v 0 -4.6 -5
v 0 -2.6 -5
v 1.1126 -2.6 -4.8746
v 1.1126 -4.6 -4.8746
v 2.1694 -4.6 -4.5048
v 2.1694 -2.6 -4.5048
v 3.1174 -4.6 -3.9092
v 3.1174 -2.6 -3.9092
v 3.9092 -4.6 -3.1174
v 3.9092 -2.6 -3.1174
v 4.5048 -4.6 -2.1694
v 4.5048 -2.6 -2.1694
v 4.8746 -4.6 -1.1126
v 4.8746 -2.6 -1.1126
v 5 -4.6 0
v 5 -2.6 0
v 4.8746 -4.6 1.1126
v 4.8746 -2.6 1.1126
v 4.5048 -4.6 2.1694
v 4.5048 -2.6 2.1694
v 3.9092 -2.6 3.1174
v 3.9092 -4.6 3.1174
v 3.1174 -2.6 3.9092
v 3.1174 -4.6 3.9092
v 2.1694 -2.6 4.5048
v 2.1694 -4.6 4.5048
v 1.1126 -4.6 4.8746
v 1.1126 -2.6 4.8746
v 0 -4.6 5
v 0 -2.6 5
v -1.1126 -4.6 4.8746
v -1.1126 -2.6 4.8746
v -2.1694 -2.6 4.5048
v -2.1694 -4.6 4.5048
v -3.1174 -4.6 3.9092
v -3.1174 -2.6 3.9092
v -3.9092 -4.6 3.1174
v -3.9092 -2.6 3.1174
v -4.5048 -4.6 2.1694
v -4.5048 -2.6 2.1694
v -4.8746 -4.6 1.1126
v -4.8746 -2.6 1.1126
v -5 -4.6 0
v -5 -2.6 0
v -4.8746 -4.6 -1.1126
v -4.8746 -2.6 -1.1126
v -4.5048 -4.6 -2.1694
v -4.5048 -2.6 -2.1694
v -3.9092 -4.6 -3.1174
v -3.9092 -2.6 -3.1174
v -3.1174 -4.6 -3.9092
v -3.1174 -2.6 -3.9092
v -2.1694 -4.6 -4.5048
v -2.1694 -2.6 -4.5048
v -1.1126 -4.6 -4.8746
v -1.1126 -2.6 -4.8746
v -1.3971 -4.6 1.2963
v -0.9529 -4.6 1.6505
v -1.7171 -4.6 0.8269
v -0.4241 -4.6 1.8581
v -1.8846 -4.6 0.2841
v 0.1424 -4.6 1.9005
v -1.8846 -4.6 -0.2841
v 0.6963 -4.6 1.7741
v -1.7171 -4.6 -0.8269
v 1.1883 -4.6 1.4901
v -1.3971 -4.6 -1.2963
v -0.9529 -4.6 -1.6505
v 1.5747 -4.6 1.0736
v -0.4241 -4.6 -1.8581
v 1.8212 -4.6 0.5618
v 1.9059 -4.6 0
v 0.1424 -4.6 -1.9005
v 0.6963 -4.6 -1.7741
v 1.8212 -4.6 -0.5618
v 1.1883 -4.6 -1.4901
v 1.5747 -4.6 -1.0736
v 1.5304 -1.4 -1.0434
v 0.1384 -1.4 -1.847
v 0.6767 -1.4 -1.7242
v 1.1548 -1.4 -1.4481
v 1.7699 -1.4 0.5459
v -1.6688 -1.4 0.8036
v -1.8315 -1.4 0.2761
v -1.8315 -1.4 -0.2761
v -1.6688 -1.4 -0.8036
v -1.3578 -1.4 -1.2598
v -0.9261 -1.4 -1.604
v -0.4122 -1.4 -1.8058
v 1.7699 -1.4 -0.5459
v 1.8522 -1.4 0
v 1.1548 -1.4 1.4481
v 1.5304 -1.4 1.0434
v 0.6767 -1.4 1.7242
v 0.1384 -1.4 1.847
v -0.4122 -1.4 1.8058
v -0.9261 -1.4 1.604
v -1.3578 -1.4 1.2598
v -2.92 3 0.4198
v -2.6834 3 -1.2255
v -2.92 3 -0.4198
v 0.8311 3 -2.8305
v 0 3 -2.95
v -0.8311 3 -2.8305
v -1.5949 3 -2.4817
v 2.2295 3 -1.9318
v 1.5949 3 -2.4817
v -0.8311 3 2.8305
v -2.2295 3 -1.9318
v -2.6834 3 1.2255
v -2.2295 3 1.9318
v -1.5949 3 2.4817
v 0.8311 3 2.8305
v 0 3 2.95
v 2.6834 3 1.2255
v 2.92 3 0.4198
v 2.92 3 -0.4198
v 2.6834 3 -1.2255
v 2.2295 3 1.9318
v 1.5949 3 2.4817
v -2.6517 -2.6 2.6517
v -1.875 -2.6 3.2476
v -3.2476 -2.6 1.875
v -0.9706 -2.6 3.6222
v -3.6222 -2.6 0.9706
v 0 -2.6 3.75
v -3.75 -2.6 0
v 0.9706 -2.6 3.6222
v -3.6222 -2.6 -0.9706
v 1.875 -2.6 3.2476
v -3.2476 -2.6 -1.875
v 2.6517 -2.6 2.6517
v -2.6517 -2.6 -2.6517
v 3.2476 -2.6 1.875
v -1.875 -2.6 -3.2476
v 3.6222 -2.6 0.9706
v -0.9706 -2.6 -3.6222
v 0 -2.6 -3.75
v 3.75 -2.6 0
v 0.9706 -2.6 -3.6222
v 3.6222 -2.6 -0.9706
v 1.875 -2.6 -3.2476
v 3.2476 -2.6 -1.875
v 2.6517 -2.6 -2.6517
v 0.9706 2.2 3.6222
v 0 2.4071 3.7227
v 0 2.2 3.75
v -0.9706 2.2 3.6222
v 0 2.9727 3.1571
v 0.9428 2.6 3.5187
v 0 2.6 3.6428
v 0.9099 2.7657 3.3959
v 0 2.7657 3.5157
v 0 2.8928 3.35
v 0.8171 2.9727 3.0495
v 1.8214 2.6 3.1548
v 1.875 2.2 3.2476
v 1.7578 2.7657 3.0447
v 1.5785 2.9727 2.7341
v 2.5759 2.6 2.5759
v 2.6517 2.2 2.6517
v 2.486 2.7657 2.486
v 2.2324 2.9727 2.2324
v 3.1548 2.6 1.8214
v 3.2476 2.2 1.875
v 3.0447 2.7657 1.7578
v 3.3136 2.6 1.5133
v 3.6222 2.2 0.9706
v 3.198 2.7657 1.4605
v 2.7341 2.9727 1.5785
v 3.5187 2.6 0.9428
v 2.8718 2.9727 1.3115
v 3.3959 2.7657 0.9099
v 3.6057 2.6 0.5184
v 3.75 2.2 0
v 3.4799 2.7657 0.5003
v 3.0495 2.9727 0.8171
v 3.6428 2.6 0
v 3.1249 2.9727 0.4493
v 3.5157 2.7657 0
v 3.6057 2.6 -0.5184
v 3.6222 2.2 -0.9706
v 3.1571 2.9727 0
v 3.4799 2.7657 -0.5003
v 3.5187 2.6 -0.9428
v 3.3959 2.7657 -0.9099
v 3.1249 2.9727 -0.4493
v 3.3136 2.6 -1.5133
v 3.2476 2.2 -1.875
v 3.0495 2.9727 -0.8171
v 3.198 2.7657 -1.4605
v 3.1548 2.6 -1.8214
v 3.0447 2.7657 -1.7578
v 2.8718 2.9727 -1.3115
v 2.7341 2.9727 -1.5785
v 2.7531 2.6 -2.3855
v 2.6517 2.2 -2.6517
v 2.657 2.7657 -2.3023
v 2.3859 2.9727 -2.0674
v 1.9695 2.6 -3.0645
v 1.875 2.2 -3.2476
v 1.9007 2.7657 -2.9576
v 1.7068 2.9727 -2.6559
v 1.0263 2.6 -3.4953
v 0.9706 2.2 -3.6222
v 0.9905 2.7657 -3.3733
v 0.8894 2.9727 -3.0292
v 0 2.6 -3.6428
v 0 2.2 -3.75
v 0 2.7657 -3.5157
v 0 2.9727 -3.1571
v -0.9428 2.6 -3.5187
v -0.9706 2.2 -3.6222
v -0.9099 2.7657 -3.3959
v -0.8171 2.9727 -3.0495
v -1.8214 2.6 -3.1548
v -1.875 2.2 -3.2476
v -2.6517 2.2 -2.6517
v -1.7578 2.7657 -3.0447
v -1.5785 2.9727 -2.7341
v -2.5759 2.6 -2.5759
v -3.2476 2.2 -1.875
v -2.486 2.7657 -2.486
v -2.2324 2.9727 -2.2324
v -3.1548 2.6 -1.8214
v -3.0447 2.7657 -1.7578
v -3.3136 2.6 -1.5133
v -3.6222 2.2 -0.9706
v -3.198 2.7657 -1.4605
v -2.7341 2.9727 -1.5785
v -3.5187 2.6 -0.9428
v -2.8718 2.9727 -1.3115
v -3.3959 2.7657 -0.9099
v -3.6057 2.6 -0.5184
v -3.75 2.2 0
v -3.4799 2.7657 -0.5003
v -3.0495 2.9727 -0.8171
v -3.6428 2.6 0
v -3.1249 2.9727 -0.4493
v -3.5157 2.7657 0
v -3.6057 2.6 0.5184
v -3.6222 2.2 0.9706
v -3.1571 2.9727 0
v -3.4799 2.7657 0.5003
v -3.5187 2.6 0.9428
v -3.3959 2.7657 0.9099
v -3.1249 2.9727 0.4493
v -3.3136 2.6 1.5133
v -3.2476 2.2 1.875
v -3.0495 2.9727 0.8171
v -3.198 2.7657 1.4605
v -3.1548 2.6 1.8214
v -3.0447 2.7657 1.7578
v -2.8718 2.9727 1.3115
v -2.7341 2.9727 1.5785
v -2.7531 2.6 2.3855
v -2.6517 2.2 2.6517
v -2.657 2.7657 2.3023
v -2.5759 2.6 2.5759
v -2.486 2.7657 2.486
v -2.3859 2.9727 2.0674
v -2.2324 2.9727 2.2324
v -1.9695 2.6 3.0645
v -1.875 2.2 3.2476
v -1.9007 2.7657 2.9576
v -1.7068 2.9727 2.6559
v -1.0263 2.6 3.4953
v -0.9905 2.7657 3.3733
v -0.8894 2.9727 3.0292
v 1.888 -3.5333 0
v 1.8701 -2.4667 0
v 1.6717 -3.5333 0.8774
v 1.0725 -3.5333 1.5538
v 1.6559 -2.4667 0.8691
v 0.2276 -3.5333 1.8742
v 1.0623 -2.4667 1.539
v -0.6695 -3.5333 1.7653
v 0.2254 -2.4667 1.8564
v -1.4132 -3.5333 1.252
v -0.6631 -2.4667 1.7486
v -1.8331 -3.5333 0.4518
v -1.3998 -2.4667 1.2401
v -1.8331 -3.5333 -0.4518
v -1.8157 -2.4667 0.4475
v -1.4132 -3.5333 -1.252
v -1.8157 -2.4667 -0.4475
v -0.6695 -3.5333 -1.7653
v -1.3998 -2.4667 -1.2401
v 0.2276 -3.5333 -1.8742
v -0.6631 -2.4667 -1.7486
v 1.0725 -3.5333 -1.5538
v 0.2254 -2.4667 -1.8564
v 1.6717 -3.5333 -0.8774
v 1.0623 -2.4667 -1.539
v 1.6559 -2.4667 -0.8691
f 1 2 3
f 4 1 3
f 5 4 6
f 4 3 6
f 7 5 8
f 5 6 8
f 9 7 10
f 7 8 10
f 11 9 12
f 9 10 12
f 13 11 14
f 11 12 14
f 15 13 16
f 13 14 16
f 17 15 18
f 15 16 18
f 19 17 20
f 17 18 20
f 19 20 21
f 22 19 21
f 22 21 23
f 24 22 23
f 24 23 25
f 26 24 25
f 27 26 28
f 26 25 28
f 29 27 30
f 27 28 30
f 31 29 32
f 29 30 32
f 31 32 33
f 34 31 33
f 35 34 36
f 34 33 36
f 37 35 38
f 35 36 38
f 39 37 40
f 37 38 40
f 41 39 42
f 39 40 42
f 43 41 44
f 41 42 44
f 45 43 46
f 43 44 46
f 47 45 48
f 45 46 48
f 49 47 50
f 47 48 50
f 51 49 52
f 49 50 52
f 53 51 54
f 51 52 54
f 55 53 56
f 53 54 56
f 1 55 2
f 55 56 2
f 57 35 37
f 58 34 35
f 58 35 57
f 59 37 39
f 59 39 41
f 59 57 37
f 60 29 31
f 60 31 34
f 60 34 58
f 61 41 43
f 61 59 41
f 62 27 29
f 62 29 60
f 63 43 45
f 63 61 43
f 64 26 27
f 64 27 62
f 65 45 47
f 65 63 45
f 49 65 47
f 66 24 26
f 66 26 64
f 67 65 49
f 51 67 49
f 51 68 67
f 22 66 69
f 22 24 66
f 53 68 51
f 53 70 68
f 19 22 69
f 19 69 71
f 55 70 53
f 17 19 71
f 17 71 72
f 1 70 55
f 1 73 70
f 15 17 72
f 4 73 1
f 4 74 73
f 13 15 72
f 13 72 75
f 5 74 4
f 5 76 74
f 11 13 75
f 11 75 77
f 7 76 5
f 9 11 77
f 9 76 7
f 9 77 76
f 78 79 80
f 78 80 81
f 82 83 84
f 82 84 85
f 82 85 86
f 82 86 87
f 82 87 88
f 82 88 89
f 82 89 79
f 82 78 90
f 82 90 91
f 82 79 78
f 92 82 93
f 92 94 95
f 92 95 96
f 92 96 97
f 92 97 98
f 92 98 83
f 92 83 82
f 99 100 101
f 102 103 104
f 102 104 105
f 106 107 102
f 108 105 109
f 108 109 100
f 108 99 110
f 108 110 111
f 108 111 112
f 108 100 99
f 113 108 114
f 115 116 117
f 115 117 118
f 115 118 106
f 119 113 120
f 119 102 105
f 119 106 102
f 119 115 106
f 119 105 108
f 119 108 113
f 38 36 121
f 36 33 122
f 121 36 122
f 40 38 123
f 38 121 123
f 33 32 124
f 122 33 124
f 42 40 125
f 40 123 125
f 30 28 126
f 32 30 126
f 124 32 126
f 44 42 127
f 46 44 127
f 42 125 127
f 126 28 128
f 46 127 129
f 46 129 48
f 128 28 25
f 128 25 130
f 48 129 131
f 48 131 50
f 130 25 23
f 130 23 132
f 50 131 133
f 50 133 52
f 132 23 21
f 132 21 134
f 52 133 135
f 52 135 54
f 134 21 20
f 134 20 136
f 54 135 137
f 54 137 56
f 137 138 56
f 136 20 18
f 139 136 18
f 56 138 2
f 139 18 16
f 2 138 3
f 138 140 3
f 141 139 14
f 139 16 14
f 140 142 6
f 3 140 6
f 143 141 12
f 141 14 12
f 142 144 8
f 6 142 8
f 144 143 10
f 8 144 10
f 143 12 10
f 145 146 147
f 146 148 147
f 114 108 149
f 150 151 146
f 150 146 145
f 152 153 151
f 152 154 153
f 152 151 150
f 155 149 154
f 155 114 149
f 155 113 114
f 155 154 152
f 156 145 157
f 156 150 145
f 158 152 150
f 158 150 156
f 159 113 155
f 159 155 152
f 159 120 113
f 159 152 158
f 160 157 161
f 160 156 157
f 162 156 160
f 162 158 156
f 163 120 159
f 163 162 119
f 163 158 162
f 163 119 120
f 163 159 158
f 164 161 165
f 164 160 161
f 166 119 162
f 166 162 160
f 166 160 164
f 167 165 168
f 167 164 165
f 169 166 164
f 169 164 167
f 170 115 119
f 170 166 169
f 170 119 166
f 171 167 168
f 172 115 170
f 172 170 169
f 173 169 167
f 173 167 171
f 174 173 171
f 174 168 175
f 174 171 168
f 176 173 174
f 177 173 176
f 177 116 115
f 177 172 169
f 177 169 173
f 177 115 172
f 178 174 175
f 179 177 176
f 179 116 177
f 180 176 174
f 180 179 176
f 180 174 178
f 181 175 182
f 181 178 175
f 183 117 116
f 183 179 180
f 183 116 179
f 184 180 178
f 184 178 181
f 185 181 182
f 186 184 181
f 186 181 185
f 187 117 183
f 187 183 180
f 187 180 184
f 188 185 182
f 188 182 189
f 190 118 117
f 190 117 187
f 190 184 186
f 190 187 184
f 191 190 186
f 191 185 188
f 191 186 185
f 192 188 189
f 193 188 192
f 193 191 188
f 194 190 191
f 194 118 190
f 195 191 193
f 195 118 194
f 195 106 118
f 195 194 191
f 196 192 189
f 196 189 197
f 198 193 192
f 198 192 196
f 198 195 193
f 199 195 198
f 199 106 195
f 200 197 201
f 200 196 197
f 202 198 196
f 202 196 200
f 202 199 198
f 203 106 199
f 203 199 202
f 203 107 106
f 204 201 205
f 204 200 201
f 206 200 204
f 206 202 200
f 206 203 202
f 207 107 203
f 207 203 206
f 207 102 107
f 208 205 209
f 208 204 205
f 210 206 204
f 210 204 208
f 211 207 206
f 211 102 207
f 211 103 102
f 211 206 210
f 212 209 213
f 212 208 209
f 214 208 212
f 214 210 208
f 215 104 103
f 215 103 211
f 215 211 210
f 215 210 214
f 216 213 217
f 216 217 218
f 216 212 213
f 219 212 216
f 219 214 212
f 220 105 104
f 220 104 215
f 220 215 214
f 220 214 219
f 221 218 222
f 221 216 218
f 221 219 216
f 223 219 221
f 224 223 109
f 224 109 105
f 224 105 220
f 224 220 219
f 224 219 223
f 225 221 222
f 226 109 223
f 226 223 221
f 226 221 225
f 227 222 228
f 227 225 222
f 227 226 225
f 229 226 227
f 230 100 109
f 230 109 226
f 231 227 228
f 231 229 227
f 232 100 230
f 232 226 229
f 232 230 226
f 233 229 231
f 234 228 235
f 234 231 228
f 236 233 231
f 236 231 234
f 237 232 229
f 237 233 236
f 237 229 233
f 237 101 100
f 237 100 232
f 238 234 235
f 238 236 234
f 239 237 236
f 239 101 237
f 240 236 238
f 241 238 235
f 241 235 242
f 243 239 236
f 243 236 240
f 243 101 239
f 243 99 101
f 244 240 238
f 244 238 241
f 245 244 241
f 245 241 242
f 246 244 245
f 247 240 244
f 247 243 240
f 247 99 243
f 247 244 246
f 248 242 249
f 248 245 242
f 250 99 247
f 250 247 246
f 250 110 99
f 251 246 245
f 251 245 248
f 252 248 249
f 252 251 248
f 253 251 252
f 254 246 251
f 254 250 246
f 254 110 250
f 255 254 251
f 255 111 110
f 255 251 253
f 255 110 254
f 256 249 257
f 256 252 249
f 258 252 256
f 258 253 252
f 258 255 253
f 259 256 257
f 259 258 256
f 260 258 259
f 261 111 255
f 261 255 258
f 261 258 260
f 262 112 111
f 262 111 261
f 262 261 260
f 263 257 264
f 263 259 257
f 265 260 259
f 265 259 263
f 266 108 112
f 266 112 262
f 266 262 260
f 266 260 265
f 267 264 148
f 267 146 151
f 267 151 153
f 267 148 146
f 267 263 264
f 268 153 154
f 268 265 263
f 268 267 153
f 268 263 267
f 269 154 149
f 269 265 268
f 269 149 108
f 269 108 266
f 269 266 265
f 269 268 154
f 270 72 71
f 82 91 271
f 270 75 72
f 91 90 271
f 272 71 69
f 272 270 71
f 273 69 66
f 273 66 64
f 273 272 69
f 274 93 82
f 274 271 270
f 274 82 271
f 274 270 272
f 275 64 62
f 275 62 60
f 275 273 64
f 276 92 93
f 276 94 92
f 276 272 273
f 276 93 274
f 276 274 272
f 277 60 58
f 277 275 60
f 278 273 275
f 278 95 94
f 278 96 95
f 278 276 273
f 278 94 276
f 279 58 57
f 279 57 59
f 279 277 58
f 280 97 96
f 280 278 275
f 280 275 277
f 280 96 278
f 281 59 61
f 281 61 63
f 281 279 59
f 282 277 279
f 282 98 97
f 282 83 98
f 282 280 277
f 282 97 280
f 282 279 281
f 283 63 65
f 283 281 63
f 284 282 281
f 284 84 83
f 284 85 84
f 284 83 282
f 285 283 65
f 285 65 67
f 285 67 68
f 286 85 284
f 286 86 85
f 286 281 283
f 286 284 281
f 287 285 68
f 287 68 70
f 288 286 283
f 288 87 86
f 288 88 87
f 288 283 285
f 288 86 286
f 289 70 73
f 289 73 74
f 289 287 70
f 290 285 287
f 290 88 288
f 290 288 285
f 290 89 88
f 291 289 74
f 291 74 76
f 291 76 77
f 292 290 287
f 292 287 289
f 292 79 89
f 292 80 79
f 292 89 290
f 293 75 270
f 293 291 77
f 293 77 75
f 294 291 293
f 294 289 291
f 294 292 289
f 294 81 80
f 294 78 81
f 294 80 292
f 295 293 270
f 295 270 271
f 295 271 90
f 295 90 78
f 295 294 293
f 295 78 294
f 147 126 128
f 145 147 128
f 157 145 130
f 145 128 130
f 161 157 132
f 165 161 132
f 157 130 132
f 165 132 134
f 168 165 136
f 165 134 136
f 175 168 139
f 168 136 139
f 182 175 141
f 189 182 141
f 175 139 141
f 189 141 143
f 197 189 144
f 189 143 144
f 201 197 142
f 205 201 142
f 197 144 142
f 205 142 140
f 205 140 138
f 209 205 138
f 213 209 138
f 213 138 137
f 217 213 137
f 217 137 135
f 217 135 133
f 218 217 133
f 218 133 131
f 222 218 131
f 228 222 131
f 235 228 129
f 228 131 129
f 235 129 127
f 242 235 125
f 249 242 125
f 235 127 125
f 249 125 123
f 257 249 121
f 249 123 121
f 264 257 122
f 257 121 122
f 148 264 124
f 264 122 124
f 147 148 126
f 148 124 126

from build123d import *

# Parameters (mm, degrees)
EXTRUDE_1_DEPTH      = 3
EXTRUDE_1_DEPTH_BACK = 2.6
SKETCH_1_R           = 3.75
SKETCH_2_R           = 5
EXTRUDE_2_DEPTH      = 2
FILLET_1_R           = 0.8
SKETCH_3_R           = 1.905870149
SKETCH_4_R           = 1.852192046


# Read off the part's stored shape, not the designer's step: Отступ5
with BuildPart() as part:
    # Эскиз1 → Бобышка-Вытянуть1 (new, two sides: drawn at the far end of the back side and taken through both)
    with BuildSketch(Plane(origin=(0, 0, 0), x_dir=(1, 0, 0), z_dir=(0, 1, 0)).offset(-EXTRUDE_1_DEPTH_BACK)):
        with Locations(Location((0, 0, 0), (0, 0, 270))):
            Circle(SKETCH_1_R)
    extrude(amount=EXTRUDE_1_DEPTH + EXTRUDE_1_DEPTH_BACK)

    # Эскиз2 → Бобышка-Вытянуть2 (add)
    with BuildSketch(Plane.XZ.offset(2.6)):
        with Locations(Location((0, 0, 0), (0, 0, 270))):
            Circle(SKETCH_2_R)
    extrude(amount=EXTRUDE_2_DEPTH)

    # Скругление1
    fillet_1_edges = [part.edges().sort_by_distance(p)[0] for p in [
        (0, 3, -3.75),
    ]]
    fillet(fillet_1_edges, radius=FILLET_1_R)

    # Отступ5 outline → Отступ5 (revolve, cut)
    with BuildSketch(Plane.XY):
        with BuildLine():
            Line((1.605870149, -4.6), (1.552192046, -1.524783544))
            ThreePointArc((1.552192046, -1.524783544), (1.514226865, -1.436417193), (1.425211389, -1.4))
            Line((1.425211389, -1.4), (0, -1.4))
            Line((0, -1.4), (0, -4.6))
            Line((0, -4.6), (1.605870149, -4.6))
        make_face()
    revolve(axis=Axis((0, 0, 0), (0, 1, 0)), mode=Mode.SUBTRACT)

    # Эскиз3 → Вырез-По сечениям1 section 0
    with BuildSketch(Plane.XZ.offset(4.6)):
        Circle(SKETCH_3_R)
    # Эскиз4 → Вырез-По сечениям1 section 1
    with BuildSketch(Plane.XZ.offset(1.4)):
        Circle(SKETCH_4_R)
    loft(mode=Mode.SUBTRACT)


solid = part.part
